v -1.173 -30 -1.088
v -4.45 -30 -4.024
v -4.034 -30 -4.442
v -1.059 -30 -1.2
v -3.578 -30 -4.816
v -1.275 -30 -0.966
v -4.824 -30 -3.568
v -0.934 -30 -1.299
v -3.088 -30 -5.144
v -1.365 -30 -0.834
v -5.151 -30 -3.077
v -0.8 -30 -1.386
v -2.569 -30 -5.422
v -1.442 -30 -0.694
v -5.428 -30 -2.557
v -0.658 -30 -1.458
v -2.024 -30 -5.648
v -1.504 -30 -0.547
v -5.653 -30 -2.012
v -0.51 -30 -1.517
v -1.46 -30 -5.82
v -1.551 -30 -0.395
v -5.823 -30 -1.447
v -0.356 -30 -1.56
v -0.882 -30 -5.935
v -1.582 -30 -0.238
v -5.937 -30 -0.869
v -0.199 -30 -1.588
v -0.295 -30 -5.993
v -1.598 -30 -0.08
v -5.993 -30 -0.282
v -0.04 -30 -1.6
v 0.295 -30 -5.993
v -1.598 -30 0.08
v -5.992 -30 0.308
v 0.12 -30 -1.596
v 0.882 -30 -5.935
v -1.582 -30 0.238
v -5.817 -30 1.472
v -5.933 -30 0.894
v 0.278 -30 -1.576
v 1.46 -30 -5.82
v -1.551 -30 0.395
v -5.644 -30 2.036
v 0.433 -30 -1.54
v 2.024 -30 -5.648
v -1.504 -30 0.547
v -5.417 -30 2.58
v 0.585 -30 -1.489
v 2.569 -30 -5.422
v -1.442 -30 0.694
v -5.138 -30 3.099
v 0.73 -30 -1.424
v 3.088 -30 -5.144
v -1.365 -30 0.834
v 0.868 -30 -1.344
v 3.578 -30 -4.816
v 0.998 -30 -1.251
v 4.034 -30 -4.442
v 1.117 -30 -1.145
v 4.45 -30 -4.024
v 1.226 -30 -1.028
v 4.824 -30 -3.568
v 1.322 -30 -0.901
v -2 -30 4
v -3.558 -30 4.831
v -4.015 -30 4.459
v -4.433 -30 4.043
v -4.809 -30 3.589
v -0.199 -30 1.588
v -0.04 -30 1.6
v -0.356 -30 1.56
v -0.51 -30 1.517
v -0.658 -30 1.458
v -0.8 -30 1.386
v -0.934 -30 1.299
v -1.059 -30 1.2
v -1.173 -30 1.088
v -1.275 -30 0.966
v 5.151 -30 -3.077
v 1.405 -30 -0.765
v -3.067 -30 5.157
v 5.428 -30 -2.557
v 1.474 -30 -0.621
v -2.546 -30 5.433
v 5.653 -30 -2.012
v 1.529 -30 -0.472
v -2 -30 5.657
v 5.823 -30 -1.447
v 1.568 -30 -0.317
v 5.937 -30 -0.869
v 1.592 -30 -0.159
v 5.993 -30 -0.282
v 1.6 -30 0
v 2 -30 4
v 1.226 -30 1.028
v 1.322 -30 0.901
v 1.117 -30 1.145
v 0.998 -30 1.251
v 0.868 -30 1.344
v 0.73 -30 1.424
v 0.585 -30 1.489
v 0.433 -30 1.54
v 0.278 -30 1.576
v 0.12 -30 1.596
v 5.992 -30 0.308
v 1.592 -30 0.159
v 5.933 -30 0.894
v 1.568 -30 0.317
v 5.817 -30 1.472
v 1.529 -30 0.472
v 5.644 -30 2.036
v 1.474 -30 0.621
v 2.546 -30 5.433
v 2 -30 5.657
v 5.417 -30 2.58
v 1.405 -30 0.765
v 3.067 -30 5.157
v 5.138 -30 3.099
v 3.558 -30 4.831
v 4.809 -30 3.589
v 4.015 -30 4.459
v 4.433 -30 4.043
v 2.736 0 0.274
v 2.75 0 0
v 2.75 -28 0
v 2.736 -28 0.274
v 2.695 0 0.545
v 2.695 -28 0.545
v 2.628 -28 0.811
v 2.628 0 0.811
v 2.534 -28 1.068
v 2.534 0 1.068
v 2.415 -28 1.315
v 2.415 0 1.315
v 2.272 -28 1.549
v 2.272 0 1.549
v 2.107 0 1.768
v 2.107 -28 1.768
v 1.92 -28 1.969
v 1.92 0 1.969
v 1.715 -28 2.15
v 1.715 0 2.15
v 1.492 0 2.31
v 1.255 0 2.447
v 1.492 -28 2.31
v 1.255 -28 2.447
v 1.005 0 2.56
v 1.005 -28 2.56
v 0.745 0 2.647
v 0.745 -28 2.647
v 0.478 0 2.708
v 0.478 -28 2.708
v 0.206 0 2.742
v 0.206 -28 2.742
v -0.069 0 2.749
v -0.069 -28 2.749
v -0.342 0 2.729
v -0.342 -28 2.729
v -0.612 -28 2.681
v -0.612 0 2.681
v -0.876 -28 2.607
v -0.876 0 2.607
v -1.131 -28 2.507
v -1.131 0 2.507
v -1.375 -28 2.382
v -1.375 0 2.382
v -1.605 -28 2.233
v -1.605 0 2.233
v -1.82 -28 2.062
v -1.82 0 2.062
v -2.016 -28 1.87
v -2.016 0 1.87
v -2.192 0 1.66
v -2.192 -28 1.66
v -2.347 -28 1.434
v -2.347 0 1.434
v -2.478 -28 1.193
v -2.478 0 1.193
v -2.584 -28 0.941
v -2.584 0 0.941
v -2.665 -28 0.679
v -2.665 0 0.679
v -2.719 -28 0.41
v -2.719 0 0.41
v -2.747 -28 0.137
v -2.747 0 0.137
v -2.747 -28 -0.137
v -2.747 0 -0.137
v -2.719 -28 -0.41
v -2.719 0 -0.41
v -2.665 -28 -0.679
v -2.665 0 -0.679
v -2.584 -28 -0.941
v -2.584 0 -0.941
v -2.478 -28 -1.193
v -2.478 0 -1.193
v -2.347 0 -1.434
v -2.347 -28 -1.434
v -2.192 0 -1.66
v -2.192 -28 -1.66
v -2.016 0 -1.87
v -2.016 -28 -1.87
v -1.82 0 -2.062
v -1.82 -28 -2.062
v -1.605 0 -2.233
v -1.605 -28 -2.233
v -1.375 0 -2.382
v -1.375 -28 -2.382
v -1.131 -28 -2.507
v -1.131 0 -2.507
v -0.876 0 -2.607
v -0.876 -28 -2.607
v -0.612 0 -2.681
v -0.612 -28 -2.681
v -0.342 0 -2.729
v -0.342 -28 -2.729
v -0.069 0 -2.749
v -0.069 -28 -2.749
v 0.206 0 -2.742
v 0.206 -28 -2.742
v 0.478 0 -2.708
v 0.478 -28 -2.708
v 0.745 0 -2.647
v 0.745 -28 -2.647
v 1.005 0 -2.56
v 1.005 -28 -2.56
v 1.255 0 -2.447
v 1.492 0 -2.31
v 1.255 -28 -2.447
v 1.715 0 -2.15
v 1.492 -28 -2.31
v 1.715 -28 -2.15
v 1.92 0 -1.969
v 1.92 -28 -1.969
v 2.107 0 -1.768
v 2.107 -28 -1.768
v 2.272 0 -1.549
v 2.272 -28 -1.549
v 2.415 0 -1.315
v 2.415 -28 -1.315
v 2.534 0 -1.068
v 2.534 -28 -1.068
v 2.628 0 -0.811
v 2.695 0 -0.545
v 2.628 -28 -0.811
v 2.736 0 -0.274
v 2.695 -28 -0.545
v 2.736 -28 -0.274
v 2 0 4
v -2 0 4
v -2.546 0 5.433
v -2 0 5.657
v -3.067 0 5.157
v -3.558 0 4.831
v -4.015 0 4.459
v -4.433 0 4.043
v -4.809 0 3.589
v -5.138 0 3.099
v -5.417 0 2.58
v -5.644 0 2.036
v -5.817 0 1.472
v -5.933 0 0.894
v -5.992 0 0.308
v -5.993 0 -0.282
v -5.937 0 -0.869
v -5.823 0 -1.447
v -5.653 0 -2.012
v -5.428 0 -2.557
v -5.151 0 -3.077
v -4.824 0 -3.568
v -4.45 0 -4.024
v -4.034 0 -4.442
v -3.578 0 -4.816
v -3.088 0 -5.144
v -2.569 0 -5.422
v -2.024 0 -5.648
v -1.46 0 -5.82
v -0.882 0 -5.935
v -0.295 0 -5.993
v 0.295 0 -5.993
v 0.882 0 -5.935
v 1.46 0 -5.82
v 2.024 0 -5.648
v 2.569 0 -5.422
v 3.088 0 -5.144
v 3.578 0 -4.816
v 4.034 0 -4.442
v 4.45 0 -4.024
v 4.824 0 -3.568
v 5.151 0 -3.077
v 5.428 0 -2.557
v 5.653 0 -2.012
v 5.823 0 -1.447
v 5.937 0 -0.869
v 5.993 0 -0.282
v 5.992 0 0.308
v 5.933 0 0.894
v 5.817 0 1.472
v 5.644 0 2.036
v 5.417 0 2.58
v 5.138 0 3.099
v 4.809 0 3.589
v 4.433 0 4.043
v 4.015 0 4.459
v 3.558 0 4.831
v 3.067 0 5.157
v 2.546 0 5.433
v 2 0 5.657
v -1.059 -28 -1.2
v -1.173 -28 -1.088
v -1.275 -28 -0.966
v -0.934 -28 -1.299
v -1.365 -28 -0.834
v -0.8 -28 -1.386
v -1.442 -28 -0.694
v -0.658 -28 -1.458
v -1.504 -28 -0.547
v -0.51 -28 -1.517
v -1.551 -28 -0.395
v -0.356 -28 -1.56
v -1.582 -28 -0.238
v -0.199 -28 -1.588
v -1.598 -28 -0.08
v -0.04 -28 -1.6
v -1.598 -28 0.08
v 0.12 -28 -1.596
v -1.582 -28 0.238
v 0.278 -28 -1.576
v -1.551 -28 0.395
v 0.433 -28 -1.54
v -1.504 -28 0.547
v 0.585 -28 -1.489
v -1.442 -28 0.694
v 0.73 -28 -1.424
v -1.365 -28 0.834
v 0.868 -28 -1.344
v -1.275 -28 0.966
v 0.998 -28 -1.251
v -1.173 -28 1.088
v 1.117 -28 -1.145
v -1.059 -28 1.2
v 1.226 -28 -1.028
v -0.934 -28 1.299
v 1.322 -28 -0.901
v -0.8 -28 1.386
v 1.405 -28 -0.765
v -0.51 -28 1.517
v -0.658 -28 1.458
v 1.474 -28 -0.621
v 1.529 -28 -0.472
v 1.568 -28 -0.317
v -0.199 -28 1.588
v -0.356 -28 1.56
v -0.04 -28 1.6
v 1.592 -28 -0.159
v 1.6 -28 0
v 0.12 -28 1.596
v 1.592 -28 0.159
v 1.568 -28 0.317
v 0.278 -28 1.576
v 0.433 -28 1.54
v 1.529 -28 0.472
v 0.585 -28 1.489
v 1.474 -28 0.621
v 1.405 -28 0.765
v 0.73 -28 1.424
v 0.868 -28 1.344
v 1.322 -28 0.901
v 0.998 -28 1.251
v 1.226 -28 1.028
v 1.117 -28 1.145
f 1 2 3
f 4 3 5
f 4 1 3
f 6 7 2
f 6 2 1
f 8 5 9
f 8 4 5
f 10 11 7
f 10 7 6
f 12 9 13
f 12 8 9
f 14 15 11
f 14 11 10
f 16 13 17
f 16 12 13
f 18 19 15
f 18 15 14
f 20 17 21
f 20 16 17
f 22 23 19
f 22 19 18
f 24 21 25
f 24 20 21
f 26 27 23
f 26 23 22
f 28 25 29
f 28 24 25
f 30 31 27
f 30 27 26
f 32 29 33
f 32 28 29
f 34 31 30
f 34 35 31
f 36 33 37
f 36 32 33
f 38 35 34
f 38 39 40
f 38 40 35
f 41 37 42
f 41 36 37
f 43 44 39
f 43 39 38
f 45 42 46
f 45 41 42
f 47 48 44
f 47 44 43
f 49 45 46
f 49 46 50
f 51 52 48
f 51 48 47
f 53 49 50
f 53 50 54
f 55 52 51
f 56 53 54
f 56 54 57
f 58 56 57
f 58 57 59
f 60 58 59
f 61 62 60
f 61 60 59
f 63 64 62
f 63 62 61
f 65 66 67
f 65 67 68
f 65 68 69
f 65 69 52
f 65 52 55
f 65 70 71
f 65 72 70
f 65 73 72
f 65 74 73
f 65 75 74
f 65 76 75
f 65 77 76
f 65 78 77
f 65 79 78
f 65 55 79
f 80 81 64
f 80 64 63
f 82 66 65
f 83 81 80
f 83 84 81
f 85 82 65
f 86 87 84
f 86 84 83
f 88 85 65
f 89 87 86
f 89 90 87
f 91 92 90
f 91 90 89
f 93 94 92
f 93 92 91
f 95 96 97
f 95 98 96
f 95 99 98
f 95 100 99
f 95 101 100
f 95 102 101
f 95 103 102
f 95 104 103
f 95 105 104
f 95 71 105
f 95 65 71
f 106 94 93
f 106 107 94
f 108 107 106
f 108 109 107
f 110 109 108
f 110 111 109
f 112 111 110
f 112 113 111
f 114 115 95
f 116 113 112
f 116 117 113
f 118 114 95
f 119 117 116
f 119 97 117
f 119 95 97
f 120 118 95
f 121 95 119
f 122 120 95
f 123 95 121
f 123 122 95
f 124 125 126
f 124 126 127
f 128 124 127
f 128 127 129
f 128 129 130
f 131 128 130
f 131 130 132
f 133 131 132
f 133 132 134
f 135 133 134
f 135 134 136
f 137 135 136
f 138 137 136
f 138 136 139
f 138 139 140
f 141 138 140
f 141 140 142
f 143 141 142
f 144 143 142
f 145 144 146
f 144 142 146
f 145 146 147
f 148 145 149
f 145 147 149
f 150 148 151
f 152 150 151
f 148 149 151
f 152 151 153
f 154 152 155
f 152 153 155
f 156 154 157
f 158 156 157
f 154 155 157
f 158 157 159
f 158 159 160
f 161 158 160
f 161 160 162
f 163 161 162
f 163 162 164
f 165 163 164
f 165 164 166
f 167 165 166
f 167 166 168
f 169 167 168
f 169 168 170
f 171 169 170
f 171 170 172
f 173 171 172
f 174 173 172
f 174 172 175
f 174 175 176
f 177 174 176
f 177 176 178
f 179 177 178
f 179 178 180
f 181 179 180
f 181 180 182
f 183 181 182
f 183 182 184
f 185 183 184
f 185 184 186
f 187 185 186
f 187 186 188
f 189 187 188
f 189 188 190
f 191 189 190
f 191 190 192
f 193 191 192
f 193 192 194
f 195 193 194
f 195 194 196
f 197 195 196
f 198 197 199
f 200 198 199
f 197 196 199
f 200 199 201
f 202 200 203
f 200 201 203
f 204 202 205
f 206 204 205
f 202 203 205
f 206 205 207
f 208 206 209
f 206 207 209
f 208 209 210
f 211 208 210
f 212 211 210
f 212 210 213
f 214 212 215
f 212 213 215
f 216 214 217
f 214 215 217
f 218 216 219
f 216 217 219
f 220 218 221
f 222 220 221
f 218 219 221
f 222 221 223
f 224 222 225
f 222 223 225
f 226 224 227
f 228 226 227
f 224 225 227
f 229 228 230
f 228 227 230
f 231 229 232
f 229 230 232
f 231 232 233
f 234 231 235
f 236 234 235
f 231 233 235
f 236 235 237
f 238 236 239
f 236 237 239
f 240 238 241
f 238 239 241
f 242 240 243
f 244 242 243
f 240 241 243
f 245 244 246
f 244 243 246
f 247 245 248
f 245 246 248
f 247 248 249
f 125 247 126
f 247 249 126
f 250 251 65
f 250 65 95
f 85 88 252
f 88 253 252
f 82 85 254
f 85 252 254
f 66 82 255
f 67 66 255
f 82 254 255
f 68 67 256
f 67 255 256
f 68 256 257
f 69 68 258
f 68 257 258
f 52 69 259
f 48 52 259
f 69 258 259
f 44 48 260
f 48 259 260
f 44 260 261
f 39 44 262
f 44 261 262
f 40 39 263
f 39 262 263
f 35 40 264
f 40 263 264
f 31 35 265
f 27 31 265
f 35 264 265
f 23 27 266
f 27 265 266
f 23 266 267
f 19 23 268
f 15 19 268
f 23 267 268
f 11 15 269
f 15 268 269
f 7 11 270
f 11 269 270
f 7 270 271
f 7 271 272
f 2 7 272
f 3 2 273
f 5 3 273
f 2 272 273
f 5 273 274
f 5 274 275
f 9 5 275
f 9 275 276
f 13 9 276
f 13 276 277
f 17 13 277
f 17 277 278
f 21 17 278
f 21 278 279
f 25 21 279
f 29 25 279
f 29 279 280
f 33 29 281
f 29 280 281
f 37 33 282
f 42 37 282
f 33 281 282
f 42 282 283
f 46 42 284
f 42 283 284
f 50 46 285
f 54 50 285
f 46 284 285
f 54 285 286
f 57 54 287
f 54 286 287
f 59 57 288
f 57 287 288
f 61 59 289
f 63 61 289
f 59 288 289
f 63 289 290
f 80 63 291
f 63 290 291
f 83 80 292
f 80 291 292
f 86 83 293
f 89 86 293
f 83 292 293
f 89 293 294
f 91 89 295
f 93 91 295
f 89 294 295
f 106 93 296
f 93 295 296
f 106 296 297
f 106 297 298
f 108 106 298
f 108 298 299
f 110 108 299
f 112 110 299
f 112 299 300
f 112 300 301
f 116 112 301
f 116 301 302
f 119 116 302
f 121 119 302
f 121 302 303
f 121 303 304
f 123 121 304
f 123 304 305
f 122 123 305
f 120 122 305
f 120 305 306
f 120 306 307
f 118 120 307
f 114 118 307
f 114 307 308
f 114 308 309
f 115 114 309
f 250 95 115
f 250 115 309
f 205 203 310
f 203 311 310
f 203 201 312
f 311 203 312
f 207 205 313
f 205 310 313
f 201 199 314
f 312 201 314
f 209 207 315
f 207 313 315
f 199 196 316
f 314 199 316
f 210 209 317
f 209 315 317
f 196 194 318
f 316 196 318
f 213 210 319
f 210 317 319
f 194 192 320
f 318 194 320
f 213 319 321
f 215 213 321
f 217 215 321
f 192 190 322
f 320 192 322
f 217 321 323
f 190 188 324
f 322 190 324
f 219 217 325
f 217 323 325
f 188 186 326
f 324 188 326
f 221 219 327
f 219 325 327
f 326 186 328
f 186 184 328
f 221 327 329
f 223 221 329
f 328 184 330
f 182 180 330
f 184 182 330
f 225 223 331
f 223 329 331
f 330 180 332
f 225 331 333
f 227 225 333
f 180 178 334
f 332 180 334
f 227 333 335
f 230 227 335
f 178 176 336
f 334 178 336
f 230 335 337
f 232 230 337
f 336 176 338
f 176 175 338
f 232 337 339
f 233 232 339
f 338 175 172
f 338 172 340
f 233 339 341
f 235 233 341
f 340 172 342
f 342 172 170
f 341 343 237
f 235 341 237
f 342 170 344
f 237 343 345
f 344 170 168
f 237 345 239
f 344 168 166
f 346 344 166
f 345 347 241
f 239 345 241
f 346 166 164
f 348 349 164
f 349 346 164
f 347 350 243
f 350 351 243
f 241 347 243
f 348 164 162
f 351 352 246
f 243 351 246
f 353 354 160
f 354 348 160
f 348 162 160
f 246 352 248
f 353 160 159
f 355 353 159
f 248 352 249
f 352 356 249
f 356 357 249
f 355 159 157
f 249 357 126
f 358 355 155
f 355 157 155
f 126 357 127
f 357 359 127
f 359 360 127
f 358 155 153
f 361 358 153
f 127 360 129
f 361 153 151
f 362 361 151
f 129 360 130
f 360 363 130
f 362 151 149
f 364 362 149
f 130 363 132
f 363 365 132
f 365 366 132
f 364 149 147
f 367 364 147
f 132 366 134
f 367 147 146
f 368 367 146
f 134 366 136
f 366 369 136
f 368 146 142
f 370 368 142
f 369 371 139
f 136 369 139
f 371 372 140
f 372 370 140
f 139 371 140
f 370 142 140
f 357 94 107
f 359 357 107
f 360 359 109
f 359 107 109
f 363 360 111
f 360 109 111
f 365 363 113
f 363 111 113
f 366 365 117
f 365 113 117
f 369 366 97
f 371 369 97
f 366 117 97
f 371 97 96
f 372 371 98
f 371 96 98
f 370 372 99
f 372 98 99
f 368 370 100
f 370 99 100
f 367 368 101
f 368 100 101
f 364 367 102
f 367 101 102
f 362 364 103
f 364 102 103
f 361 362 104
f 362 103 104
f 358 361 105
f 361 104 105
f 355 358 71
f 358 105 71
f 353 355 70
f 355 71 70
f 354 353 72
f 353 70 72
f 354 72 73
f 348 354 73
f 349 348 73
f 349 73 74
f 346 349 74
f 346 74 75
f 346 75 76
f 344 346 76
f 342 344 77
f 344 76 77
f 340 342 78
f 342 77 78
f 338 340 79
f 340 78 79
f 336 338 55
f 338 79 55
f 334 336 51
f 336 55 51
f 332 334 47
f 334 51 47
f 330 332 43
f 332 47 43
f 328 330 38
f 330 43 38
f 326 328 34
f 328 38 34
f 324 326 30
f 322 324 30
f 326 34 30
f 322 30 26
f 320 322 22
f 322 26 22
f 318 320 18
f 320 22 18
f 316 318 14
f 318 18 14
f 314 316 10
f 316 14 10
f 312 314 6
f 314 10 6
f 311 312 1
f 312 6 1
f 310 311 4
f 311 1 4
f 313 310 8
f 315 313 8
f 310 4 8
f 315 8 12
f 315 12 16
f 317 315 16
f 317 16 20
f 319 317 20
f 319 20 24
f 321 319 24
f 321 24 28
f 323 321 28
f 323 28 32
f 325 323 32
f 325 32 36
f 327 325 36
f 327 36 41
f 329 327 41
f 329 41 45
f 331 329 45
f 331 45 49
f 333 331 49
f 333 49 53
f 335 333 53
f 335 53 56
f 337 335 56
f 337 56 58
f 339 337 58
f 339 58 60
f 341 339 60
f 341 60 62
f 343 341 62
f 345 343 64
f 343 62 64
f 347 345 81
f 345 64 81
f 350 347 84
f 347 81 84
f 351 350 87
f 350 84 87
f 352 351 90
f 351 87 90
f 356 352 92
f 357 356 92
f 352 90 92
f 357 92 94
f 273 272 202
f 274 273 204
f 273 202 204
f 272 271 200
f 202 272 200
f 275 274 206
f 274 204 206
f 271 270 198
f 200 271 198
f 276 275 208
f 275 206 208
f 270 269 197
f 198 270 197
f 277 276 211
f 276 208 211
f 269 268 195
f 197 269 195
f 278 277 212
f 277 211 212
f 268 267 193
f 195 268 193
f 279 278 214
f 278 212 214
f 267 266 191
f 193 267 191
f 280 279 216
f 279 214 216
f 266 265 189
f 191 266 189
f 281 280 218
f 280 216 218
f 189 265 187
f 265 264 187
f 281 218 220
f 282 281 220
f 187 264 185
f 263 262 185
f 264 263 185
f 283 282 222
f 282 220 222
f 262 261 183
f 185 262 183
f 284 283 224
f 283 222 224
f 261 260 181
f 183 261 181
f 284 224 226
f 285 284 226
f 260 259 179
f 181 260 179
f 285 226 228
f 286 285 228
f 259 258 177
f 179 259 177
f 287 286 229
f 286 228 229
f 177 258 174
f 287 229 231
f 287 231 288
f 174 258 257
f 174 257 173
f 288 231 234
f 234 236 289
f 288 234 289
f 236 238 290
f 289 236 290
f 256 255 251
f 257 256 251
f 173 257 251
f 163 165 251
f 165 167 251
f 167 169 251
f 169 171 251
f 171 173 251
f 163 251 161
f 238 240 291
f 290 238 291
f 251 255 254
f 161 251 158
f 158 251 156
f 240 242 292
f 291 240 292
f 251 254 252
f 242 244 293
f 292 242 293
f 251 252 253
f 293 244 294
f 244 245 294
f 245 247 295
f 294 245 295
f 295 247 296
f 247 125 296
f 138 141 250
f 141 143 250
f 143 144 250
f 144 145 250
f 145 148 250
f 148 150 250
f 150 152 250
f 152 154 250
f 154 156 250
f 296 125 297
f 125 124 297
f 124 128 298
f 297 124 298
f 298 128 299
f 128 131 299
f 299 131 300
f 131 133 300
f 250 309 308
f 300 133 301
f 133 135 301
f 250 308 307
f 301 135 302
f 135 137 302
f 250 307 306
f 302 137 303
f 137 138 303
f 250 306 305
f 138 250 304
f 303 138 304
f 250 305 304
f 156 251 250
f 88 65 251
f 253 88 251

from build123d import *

# Parameters (mm, degrees)
F0_R      = 6
F1_DEPTH  = 30
F2_R      = 2.75
F3_DEPTH  = 30.001
F8_R      = 5
F8_R_2    = 1.6
F9_DEPTH  = 2
F12_W     = 4
F12_H     = 30
F13_DEPTH = 3


with BuildPart() as f1:
    # F0 (on Front) → F1 (new body)
    with BuildSketch(Plane.XZ):
        Circle(F0_R)
    extrude(amount=F1_DEPTH)

    # F2 (on face) → F3 (cut, through all)
    with BuildSketch(Plane.XZ.offset(30)):
        Circle(F2_R)
    extrude(amount=-F3_DEPTH, mode=Mode.SUBTRACT)

    # F8 (on face) → F9 (join)
    with BuildSketch(Plane.XZ.offset(30)):
        Circle(F8_R)
        Circle(F8_R_2, mode=Mode.SUBTRACT)
    extrude(amount=-F9_DEPTH)

    # F12 (on offset) → F13 (cut)
    with BuildSketch(Plane.XY.offset(4)):
        with Locations((0, -15)):
            Rectangle(F12_W, F12_H)
    extrude(amount=F13_DEPTH, mode=Mode.SUBTRACT)


solid = f1.part
